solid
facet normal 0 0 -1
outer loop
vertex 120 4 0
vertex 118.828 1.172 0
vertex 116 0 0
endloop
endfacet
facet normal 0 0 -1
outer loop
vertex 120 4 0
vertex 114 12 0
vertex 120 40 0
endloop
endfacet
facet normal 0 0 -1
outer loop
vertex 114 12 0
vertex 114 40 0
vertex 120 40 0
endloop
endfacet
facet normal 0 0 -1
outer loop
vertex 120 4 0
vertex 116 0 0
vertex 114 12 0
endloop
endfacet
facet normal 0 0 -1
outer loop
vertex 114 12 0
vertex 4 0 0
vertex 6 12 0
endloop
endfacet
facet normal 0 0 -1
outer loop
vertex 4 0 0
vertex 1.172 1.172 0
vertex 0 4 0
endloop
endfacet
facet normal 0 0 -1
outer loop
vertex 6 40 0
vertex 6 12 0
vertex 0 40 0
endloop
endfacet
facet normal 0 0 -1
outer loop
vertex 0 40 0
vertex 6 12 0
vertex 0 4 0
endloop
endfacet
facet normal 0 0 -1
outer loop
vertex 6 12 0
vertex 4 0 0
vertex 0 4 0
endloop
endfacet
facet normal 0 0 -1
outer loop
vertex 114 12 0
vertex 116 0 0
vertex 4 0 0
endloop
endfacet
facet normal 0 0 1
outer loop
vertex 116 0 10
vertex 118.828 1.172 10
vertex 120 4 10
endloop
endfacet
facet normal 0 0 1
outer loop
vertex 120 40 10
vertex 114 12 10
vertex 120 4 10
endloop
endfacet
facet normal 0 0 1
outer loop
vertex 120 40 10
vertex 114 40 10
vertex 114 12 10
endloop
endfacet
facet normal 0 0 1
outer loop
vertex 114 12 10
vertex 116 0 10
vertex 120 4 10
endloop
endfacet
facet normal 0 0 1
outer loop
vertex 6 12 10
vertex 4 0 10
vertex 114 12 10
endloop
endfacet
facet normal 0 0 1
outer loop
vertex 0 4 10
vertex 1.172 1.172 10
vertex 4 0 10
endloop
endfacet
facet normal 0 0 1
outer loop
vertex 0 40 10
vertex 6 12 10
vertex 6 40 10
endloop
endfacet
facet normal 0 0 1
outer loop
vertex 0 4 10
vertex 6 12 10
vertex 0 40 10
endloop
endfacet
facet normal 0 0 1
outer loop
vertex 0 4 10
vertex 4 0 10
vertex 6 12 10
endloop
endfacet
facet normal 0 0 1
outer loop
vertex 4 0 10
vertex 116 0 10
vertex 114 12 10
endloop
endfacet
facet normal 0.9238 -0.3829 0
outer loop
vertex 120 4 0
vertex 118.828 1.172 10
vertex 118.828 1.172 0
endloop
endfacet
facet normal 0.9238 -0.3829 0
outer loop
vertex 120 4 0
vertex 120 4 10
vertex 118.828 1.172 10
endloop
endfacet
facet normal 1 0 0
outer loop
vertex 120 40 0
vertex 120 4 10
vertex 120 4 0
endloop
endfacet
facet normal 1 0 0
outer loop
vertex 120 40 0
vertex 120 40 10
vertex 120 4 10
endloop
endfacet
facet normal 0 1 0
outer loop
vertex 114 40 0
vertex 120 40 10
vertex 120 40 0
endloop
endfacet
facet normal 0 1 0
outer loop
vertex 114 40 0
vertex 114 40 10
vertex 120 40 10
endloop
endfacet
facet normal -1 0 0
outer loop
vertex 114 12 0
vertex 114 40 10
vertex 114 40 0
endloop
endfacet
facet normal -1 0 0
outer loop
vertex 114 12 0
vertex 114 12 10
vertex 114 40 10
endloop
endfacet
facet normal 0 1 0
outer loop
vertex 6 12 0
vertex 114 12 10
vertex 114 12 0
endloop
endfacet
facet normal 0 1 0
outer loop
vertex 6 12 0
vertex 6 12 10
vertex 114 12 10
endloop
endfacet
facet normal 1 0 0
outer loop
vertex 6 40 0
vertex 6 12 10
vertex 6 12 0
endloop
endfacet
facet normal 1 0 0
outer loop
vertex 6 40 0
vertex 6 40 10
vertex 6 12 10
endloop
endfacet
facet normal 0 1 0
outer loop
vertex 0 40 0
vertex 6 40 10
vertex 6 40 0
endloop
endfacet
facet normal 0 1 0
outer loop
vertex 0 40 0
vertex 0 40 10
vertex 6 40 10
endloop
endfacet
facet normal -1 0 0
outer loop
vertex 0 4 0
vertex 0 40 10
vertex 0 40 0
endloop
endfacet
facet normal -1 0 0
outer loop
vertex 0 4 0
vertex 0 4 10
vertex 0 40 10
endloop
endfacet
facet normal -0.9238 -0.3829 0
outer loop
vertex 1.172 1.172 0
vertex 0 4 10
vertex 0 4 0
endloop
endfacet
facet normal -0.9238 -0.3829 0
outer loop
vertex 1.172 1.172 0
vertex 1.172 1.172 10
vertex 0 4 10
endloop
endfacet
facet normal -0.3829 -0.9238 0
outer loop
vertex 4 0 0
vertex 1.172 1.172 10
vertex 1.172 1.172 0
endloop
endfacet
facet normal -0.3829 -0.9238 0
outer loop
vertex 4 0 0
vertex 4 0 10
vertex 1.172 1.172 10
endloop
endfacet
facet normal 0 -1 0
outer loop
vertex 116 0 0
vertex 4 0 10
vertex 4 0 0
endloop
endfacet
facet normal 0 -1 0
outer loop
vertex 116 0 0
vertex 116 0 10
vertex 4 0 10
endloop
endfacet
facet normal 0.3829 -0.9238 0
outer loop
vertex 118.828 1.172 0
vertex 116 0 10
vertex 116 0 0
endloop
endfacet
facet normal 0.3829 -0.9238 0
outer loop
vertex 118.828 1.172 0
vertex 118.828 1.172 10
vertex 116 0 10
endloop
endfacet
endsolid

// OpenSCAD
$fn = 32;

// ----------------------------------------------------------------------
// Heat sink frame: 120 x 40 mm frame, 6 mm walls
// ----------------------------------------------------------------------

// --- parameters (mm) ---
profile_height = 10;      // extrusion height
profile_points = 12;      // points of the closed outline

profile = [[0, 4], [1.172, 1.172], [4, 0], [116, 0], [118.828, 1.172], [120, 4], [120, 40], [114, 40], [114, 12], [6, 12], [6, 40], [0, 40]];  // single closed polygon, 12 points, counter clockwise

// --- the one profile operation ---
linear_extrude(height = profile_height) polygon(points = profile);
